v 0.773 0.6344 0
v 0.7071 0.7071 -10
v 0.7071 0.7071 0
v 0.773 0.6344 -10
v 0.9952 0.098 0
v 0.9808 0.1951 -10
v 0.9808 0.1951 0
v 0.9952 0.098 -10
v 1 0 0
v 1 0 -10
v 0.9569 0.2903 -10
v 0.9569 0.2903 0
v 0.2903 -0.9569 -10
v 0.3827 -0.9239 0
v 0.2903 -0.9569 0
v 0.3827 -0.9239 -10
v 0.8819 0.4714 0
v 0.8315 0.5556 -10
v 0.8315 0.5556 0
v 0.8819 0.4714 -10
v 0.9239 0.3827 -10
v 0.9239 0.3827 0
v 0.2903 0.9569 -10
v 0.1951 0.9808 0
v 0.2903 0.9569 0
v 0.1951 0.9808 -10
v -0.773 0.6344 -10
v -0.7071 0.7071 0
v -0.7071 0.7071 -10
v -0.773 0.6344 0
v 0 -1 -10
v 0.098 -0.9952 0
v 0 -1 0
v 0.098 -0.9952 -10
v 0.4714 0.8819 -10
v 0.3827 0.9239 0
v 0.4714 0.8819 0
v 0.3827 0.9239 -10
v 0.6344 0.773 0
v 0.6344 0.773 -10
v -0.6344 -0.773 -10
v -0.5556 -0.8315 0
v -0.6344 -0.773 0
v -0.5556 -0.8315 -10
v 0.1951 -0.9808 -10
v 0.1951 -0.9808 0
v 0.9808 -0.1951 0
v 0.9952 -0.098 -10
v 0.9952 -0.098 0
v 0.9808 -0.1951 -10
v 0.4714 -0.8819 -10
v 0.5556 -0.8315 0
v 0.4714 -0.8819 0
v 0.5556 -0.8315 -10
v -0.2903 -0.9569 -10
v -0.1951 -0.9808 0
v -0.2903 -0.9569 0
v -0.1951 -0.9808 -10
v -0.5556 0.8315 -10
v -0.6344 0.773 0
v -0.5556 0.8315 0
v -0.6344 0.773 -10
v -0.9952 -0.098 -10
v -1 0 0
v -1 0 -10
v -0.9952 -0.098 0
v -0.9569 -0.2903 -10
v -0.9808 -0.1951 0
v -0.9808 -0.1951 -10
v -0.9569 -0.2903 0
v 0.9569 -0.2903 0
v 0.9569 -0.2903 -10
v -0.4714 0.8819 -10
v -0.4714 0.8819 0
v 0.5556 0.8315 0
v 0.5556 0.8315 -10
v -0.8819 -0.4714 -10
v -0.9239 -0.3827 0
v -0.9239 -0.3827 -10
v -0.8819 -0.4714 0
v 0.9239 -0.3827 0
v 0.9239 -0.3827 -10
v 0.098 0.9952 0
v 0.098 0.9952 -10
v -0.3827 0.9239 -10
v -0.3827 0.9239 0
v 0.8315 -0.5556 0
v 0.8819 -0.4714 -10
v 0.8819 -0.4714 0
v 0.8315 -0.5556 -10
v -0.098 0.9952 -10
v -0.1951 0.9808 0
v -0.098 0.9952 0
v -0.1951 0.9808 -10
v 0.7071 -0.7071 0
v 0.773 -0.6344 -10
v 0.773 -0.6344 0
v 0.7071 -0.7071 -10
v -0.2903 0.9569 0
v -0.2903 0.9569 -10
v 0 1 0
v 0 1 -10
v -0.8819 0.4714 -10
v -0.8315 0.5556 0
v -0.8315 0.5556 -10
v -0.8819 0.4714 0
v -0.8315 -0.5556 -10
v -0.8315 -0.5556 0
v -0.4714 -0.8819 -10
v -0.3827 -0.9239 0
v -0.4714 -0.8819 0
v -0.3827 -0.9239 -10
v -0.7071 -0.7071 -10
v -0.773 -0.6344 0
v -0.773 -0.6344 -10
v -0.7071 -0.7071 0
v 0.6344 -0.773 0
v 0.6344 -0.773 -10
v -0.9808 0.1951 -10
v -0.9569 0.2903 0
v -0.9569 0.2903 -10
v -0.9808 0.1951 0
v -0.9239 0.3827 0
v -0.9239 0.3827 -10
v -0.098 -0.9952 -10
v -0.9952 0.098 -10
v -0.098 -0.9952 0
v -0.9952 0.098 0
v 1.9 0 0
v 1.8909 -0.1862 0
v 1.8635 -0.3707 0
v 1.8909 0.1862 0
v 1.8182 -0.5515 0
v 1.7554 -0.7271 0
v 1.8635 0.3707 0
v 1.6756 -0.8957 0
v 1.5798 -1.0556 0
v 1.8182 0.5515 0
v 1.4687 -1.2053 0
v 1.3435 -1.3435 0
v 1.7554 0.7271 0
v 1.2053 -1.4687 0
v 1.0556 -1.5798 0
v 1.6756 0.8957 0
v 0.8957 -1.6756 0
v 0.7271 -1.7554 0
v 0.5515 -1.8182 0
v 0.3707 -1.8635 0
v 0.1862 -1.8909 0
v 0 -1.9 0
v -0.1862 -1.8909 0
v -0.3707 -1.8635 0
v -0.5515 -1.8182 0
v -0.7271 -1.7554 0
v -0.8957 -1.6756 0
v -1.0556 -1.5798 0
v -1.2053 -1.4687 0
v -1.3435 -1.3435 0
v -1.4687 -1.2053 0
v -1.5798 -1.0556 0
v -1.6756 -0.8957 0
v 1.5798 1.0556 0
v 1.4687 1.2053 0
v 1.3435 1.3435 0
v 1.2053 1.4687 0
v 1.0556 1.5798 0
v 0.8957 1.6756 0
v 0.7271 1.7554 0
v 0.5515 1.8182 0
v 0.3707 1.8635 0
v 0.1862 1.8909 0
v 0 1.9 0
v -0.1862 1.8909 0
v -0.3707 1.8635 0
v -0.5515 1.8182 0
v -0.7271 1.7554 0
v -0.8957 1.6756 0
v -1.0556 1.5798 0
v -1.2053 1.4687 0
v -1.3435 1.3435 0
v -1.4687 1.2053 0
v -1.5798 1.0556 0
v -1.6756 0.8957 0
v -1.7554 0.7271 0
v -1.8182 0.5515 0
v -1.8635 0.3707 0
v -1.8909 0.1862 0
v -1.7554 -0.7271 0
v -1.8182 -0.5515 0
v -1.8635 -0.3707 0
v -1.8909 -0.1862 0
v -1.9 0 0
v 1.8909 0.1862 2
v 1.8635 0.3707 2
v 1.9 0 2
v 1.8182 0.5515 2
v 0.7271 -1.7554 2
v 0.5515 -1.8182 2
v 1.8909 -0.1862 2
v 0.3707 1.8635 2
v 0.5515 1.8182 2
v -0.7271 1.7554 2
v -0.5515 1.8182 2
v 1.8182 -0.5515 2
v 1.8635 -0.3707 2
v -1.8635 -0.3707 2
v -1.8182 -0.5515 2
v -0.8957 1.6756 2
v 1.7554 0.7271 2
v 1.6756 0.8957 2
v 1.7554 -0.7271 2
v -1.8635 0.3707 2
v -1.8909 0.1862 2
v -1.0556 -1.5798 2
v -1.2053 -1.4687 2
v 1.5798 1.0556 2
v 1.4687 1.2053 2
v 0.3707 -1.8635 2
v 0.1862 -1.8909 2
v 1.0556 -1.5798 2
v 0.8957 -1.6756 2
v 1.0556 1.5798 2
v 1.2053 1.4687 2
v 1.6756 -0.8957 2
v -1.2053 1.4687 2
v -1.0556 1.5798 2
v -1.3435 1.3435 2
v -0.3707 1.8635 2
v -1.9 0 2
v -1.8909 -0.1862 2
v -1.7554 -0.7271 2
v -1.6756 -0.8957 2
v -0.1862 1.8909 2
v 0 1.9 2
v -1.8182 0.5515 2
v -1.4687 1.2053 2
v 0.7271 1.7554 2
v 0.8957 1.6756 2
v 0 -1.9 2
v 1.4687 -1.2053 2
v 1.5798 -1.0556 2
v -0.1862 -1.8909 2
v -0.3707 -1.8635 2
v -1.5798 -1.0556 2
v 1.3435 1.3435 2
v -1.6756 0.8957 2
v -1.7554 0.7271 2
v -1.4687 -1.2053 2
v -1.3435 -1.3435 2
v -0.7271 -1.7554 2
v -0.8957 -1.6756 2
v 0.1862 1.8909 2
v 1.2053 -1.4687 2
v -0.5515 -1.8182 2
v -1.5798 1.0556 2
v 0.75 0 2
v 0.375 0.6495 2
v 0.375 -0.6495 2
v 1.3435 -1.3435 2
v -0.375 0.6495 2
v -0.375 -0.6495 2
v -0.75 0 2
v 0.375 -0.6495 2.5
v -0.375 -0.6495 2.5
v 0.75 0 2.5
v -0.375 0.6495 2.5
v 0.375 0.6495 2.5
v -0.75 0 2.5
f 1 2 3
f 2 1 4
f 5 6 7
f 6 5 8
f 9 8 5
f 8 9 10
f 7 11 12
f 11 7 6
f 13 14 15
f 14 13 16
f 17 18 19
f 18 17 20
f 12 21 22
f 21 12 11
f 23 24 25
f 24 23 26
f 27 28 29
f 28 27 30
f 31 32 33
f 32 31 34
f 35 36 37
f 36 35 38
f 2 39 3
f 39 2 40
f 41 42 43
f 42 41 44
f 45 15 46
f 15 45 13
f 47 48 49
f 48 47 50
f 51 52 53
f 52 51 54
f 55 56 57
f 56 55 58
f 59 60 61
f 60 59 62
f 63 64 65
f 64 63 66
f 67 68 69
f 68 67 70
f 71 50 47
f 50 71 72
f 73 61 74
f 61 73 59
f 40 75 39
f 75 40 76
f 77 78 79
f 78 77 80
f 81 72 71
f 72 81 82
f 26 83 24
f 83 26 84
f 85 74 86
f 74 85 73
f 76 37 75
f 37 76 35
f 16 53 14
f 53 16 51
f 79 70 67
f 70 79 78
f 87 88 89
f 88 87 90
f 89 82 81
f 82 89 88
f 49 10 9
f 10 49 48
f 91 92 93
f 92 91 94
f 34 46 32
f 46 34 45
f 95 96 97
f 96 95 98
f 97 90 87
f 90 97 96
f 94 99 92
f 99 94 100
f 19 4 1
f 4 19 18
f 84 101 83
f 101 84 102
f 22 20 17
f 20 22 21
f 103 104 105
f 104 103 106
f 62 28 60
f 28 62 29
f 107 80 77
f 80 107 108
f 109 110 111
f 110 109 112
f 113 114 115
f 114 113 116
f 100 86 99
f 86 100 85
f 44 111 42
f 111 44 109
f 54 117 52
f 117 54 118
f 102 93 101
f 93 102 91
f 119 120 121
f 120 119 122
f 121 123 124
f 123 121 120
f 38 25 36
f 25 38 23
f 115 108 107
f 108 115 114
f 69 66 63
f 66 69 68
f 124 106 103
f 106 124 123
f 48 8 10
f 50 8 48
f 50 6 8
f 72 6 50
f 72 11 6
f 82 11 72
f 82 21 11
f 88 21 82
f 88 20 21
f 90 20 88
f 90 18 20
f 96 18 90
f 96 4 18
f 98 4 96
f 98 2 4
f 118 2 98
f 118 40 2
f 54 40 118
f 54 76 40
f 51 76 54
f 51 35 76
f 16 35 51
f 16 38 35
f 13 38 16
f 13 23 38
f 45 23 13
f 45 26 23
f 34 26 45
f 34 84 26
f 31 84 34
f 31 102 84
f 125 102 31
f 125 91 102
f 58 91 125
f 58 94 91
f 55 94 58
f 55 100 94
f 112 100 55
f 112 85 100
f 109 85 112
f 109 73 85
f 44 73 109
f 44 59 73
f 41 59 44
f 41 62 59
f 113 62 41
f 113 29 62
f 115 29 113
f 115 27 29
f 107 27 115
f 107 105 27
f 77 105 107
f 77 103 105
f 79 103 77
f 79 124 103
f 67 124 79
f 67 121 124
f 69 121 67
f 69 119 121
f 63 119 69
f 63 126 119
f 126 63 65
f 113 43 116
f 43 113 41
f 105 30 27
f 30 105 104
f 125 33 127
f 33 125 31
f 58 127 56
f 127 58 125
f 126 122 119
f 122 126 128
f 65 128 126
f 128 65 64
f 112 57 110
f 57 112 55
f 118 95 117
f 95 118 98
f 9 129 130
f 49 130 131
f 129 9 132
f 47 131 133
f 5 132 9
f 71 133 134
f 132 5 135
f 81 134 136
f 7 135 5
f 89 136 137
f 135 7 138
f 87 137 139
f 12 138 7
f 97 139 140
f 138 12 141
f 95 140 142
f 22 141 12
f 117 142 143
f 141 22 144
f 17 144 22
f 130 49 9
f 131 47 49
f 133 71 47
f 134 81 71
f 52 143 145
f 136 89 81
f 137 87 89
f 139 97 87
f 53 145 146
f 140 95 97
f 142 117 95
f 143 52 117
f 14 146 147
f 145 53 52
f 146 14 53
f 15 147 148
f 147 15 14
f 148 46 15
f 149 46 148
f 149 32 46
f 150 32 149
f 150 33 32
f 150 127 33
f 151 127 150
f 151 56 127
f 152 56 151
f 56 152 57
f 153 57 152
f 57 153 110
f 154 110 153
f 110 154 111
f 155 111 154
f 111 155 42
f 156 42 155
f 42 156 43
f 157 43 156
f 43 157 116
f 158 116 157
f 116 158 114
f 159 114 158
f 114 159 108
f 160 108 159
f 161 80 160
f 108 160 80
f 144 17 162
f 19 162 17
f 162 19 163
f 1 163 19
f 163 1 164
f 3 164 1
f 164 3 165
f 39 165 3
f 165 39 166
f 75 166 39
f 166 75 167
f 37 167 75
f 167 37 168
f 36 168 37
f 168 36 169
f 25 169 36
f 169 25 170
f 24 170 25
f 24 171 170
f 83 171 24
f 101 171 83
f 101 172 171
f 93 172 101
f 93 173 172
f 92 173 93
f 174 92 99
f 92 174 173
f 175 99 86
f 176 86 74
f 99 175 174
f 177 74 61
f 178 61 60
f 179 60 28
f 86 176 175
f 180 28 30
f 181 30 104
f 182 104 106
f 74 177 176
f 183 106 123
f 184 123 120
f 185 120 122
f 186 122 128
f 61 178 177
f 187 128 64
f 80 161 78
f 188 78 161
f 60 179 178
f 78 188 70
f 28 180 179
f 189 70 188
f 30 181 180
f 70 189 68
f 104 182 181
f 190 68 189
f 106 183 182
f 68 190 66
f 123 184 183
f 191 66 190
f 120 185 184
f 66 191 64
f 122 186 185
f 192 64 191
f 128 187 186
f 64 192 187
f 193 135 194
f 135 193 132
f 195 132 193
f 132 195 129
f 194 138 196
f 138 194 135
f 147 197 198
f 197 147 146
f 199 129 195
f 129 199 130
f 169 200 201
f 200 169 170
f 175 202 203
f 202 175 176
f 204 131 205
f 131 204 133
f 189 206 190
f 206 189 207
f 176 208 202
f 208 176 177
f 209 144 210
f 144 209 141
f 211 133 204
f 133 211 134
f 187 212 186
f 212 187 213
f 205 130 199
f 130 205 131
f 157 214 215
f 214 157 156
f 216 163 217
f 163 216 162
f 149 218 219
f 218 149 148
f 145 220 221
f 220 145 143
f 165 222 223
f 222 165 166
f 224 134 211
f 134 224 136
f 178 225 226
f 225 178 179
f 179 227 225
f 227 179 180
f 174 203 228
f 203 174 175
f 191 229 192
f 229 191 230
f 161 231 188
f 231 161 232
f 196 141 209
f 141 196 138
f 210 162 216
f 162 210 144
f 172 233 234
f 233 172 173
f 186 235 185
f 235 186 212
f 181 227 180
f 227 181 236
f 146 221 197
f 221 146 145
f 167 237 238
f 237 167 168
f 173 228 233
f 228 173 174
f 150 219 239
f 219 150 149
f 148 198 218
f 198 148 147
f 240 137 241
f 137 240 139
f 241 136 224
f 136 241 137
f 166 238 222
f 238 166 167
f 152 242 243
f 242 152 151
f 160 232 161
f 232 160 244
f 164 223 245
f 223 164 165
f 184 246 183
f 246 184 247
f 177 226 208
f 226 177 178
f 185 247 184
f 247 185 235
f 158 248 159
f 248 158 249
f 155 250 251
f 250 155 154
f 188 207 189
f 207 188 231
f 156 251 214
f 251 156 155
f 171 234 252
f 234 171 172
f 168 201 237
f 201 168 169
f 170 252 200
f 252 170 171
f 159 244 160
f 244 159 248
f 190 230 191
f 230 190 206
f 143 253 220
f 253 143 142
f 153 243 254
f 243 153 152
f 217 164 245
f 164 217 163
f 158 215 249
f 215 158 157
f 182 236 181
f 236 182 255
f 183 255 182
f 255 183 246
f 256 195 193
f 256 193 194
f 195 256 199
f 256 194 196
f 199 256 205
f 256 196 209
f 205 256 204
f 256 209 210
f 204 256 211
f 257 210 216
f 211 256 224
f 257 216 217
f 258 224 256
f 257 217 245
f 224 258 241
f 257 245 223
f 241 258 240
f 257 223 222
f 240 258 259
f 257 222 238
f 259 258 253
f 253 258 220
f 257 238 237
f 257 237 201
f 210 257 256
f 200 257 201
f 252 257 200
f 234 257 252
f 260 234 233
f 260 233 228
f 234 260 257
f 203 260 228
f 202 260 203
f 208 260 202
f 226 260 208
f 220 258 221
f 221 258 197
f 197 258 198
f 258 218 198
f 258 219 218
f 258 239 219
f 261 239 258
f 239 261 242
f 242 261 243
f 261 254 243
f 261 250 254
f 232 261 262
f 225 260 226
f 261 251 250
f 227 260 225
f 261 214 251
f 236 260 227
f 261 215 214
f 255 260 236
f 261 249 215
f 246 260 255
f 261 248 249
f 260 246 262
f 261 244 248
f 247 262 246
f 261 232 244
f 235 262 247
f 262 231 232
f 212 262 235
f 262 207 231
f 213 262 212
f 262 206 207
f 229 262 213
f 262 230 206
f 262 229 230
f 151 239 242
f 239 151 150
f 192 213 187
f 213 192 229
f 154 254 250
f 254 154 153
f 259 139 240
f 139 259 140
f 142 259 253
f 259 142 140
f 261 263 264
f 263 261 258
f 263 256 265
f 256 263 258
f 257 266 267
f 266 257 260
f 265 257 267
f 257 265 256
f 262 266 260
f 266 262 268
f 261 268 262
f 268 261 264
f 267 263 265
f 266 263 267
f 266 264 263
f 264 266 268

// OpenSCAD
module socket_head_cap_screw() {
    union() {
        // Screw shaft
        translate([0, 0, -10])
            cylinder(h=10, d=2.0, $fn=64);
        
        // Screw head
        translate([0, 0, 0])
            cylinder(h=2.0, d=3.8, $fn=64);
        
        // Hex socket
        translate([0, 0, 1])
            cylinder(h=1.5, d=1.5, $fn=6);
    }
}

socket_head_cap_screw();
